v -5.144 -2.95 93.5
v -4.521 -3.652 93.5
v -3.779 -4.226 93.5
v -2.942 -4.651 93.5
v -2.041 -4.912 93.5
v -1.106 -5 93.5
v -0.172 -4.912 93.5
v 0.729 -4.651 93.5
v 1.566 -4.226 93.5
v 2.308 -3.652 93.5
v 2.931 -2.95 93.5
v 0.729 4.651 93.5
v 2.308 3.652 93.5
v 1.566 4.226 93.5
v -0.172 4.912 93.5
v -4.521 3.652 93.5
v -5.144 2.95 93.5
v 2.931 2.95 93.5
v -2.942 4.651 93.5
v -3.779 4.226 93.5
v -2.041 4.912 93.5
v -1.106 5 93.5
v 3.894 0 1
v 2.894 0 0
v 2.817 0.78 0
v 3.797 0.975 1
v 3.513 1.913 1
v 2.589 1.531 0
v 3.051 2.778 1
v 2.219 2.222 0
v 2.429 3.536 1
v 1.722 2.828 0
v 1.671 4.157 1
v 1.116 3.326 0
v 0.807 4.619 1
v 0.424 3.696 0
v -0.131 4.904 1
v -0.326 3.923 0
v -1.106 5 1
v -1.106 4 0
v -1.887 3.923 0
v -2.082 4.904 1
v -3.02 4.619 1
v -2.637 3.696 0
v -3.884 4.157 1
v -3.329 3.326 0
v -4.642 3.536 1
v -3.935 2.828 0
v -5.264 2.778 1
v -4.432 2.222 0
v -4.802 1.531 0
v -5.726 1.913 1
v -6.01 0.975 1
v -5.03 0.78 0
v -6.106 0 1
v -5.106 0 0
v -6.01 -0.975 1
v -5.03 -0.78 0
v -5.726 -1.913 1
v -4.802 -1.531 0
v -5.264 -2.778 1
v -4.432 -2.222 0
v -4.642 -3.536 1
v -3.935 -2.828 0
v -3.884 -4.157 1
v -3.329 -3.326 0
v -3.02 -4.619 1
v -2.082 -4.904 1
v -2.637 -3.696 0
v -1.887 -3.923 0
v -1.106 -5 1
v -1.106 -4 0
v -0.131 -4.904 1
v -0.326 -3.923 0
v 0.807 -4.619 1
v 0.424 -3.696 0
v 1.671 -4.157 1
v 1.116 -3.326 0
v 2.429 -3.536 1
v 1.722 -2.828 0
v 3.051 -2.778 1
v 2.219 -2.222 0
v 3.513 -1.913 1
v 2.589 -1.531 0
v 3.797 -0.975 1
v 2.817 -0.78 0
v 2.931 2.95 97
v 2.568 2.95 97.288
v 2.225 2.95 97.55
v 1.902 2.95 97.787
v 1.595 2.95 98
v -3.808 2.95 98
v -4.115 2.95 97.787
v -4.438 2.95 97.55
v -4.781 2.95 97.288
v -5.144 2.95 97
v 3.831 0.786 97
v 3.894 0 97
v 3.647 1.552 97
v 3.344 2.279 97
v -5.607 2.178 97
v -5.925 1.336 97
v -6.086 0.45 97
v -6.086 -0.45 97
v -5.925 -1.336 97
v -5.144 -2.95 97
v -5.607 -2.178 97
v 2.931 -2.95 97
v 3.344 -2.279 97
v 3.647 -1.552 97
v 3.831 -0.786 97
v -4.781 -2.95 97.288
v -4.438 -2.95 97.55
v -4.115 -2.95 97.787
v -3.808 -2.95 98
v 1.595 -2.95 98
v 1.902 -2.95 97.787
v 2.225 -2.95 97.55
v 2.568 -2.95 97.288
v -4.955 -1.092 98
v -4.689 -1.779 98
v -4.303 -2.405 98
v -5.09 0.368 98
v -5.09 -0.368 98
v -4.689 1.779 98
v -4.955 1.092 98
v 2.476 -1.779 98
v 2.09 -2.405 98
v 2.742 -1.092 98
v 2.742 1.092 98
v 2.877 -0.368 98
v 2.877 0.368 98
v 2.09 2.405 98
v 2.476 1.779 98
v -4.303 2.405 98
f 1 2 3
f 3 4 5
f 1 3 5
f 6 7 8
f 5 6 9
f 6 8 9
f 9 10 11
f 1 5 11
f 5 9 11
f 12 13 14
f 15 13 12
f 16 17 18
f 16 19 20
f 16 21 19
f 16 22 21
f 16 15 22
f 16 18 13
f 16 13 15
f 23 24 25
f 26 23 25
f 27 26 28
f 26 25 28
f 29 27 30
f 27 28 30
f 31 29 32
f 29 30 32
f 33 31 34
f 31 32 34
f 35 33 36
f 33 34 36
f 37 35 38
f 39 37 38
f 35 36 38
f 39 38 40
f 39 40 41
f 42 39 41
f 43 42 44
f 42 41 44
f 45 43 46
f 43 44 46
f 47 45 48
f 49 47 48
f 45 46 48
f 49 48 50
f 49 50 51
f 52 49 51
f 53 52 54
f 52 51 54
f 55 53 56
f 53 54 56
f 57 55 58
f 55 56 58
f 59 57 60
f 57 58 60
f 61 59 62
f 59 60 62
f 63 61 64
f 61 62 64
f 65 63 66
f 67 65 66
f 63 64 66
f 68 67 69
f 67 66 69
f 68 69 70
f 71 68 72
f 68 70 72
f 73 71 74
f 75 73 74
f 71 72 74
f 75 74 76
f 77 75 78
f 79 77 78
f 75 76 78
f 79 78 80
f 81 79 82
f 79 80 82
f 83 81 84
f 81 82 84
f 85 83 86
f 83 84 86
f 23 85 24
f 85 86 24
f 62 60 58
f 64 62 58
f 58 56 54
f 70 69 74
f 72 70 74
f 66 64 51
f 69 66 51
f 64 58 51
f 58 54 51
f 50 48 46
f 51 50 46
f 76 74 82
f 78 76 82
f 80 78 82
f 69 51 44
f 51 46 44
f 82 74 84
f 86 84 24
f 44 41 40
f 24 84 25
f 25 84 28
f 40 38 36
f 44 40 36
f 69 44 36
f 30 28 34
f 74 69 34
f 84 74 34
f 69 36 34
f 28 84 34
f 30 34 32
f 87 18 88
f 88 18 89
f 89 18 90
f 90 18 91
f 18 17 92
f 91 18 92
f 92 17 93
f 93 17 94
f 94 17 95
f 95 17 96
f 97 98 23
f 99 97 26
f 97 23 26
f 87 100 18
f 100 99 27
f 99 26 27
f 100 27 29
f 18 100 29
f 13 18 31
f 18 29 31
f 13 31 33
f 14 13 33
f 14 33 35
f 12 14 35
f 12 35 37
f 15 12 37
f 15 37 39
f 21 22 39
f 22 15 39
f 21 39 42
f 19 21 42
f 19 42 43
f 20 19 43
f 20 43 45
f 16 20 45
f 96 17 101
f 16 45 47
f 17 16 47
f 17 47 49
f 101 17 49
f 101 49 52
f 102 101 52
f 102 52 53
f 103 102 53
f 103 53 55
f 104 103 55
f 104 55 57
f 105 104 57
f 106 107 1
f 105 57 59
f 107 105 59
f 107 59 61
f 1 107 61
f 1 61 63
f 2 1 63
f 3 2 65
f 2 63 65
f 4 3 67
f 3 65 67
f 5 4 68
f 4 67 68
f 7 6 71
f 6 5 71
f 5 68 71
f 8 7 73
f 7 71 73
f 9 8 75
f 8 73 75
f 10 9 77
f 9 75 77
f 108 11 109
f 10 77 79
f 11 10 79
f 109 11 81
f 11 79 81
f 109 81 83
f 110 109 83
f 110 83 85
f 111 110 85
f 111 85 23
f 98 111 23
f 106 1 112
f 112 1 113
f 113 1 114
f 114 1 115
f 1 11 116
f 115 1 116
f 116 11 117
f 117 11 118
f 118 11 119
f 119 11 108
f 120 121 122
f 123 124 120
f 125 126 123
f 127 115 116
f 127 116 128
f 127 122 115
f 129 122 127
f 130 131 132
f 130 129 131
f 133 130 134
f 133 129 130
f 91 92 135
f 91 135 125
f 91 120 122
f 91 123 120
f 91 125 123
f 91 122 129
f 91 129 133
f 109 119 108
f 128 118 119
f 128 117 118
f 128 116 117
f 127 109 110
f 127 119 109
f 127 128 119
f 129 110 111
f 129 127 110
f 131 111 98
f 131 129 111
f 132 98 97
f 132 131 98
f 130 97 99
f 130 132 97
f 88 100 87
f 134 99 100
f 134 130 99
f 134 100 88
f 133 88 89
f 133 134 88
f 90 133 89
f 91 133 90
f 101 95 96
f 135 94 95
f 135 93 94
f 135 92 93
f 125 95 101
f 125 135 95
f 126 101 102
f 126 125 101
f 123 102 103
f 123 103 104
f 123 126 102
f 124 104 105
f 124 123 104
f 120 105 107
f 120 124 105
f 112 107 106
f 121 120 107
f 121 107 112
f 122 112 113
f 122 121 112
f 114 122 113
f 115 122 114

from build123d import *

# Parameters (mm, degrees)
F0_R     = 5
F1_DEPTH = 98
F2_W     = 4.8668145407
F2_H     = 4.5
F2_W_2   = 5.1924452364
F3_DEPTH = 12.5
F4_SIZE  = 1
F5_SIZE  = 1


with BuildPart() as f1:
    # F0 (on Top) → F1 (new body)
    with BuildSketch(Plane.XY):
        with Locations((-1.1064895812, 0)):
            Circle(F0_R)
    extrude(amount=F1_DEPTH)

    # F2 (on Right) → F3 (cut, symmetric)
    with BuildSketch(Plane.YZ):
        with Locations((5.3834072703, 95.75)):
            Rectangle(F2_W, F2_H)
        with Locations((-5.5462226182, 95.75)):
            Rectangle(F2_W_2, F2_H)
    extrude(amount=F3_DEPTH, both=True, mode=Mode.SUBTRACT)

    # F4
    f4_edges = [f1.edges().sort_by_distance(p)[0] for p in [
        (3.646672, -1.551599, 98),
        (-6.10649, 0, 98),
        (3.646672, 1.551599, 98),
    ]]
    chamfer(f4_edges, length=F4_SIZE)

    # F5
    f5_edges = [f1.edges().sort_by_distance(p)[0] for p in [
        (-6.10649, 0, 0),
    ]]
    chamfer(f5_edges, length=F5_SIZE)


solid = f1.part
